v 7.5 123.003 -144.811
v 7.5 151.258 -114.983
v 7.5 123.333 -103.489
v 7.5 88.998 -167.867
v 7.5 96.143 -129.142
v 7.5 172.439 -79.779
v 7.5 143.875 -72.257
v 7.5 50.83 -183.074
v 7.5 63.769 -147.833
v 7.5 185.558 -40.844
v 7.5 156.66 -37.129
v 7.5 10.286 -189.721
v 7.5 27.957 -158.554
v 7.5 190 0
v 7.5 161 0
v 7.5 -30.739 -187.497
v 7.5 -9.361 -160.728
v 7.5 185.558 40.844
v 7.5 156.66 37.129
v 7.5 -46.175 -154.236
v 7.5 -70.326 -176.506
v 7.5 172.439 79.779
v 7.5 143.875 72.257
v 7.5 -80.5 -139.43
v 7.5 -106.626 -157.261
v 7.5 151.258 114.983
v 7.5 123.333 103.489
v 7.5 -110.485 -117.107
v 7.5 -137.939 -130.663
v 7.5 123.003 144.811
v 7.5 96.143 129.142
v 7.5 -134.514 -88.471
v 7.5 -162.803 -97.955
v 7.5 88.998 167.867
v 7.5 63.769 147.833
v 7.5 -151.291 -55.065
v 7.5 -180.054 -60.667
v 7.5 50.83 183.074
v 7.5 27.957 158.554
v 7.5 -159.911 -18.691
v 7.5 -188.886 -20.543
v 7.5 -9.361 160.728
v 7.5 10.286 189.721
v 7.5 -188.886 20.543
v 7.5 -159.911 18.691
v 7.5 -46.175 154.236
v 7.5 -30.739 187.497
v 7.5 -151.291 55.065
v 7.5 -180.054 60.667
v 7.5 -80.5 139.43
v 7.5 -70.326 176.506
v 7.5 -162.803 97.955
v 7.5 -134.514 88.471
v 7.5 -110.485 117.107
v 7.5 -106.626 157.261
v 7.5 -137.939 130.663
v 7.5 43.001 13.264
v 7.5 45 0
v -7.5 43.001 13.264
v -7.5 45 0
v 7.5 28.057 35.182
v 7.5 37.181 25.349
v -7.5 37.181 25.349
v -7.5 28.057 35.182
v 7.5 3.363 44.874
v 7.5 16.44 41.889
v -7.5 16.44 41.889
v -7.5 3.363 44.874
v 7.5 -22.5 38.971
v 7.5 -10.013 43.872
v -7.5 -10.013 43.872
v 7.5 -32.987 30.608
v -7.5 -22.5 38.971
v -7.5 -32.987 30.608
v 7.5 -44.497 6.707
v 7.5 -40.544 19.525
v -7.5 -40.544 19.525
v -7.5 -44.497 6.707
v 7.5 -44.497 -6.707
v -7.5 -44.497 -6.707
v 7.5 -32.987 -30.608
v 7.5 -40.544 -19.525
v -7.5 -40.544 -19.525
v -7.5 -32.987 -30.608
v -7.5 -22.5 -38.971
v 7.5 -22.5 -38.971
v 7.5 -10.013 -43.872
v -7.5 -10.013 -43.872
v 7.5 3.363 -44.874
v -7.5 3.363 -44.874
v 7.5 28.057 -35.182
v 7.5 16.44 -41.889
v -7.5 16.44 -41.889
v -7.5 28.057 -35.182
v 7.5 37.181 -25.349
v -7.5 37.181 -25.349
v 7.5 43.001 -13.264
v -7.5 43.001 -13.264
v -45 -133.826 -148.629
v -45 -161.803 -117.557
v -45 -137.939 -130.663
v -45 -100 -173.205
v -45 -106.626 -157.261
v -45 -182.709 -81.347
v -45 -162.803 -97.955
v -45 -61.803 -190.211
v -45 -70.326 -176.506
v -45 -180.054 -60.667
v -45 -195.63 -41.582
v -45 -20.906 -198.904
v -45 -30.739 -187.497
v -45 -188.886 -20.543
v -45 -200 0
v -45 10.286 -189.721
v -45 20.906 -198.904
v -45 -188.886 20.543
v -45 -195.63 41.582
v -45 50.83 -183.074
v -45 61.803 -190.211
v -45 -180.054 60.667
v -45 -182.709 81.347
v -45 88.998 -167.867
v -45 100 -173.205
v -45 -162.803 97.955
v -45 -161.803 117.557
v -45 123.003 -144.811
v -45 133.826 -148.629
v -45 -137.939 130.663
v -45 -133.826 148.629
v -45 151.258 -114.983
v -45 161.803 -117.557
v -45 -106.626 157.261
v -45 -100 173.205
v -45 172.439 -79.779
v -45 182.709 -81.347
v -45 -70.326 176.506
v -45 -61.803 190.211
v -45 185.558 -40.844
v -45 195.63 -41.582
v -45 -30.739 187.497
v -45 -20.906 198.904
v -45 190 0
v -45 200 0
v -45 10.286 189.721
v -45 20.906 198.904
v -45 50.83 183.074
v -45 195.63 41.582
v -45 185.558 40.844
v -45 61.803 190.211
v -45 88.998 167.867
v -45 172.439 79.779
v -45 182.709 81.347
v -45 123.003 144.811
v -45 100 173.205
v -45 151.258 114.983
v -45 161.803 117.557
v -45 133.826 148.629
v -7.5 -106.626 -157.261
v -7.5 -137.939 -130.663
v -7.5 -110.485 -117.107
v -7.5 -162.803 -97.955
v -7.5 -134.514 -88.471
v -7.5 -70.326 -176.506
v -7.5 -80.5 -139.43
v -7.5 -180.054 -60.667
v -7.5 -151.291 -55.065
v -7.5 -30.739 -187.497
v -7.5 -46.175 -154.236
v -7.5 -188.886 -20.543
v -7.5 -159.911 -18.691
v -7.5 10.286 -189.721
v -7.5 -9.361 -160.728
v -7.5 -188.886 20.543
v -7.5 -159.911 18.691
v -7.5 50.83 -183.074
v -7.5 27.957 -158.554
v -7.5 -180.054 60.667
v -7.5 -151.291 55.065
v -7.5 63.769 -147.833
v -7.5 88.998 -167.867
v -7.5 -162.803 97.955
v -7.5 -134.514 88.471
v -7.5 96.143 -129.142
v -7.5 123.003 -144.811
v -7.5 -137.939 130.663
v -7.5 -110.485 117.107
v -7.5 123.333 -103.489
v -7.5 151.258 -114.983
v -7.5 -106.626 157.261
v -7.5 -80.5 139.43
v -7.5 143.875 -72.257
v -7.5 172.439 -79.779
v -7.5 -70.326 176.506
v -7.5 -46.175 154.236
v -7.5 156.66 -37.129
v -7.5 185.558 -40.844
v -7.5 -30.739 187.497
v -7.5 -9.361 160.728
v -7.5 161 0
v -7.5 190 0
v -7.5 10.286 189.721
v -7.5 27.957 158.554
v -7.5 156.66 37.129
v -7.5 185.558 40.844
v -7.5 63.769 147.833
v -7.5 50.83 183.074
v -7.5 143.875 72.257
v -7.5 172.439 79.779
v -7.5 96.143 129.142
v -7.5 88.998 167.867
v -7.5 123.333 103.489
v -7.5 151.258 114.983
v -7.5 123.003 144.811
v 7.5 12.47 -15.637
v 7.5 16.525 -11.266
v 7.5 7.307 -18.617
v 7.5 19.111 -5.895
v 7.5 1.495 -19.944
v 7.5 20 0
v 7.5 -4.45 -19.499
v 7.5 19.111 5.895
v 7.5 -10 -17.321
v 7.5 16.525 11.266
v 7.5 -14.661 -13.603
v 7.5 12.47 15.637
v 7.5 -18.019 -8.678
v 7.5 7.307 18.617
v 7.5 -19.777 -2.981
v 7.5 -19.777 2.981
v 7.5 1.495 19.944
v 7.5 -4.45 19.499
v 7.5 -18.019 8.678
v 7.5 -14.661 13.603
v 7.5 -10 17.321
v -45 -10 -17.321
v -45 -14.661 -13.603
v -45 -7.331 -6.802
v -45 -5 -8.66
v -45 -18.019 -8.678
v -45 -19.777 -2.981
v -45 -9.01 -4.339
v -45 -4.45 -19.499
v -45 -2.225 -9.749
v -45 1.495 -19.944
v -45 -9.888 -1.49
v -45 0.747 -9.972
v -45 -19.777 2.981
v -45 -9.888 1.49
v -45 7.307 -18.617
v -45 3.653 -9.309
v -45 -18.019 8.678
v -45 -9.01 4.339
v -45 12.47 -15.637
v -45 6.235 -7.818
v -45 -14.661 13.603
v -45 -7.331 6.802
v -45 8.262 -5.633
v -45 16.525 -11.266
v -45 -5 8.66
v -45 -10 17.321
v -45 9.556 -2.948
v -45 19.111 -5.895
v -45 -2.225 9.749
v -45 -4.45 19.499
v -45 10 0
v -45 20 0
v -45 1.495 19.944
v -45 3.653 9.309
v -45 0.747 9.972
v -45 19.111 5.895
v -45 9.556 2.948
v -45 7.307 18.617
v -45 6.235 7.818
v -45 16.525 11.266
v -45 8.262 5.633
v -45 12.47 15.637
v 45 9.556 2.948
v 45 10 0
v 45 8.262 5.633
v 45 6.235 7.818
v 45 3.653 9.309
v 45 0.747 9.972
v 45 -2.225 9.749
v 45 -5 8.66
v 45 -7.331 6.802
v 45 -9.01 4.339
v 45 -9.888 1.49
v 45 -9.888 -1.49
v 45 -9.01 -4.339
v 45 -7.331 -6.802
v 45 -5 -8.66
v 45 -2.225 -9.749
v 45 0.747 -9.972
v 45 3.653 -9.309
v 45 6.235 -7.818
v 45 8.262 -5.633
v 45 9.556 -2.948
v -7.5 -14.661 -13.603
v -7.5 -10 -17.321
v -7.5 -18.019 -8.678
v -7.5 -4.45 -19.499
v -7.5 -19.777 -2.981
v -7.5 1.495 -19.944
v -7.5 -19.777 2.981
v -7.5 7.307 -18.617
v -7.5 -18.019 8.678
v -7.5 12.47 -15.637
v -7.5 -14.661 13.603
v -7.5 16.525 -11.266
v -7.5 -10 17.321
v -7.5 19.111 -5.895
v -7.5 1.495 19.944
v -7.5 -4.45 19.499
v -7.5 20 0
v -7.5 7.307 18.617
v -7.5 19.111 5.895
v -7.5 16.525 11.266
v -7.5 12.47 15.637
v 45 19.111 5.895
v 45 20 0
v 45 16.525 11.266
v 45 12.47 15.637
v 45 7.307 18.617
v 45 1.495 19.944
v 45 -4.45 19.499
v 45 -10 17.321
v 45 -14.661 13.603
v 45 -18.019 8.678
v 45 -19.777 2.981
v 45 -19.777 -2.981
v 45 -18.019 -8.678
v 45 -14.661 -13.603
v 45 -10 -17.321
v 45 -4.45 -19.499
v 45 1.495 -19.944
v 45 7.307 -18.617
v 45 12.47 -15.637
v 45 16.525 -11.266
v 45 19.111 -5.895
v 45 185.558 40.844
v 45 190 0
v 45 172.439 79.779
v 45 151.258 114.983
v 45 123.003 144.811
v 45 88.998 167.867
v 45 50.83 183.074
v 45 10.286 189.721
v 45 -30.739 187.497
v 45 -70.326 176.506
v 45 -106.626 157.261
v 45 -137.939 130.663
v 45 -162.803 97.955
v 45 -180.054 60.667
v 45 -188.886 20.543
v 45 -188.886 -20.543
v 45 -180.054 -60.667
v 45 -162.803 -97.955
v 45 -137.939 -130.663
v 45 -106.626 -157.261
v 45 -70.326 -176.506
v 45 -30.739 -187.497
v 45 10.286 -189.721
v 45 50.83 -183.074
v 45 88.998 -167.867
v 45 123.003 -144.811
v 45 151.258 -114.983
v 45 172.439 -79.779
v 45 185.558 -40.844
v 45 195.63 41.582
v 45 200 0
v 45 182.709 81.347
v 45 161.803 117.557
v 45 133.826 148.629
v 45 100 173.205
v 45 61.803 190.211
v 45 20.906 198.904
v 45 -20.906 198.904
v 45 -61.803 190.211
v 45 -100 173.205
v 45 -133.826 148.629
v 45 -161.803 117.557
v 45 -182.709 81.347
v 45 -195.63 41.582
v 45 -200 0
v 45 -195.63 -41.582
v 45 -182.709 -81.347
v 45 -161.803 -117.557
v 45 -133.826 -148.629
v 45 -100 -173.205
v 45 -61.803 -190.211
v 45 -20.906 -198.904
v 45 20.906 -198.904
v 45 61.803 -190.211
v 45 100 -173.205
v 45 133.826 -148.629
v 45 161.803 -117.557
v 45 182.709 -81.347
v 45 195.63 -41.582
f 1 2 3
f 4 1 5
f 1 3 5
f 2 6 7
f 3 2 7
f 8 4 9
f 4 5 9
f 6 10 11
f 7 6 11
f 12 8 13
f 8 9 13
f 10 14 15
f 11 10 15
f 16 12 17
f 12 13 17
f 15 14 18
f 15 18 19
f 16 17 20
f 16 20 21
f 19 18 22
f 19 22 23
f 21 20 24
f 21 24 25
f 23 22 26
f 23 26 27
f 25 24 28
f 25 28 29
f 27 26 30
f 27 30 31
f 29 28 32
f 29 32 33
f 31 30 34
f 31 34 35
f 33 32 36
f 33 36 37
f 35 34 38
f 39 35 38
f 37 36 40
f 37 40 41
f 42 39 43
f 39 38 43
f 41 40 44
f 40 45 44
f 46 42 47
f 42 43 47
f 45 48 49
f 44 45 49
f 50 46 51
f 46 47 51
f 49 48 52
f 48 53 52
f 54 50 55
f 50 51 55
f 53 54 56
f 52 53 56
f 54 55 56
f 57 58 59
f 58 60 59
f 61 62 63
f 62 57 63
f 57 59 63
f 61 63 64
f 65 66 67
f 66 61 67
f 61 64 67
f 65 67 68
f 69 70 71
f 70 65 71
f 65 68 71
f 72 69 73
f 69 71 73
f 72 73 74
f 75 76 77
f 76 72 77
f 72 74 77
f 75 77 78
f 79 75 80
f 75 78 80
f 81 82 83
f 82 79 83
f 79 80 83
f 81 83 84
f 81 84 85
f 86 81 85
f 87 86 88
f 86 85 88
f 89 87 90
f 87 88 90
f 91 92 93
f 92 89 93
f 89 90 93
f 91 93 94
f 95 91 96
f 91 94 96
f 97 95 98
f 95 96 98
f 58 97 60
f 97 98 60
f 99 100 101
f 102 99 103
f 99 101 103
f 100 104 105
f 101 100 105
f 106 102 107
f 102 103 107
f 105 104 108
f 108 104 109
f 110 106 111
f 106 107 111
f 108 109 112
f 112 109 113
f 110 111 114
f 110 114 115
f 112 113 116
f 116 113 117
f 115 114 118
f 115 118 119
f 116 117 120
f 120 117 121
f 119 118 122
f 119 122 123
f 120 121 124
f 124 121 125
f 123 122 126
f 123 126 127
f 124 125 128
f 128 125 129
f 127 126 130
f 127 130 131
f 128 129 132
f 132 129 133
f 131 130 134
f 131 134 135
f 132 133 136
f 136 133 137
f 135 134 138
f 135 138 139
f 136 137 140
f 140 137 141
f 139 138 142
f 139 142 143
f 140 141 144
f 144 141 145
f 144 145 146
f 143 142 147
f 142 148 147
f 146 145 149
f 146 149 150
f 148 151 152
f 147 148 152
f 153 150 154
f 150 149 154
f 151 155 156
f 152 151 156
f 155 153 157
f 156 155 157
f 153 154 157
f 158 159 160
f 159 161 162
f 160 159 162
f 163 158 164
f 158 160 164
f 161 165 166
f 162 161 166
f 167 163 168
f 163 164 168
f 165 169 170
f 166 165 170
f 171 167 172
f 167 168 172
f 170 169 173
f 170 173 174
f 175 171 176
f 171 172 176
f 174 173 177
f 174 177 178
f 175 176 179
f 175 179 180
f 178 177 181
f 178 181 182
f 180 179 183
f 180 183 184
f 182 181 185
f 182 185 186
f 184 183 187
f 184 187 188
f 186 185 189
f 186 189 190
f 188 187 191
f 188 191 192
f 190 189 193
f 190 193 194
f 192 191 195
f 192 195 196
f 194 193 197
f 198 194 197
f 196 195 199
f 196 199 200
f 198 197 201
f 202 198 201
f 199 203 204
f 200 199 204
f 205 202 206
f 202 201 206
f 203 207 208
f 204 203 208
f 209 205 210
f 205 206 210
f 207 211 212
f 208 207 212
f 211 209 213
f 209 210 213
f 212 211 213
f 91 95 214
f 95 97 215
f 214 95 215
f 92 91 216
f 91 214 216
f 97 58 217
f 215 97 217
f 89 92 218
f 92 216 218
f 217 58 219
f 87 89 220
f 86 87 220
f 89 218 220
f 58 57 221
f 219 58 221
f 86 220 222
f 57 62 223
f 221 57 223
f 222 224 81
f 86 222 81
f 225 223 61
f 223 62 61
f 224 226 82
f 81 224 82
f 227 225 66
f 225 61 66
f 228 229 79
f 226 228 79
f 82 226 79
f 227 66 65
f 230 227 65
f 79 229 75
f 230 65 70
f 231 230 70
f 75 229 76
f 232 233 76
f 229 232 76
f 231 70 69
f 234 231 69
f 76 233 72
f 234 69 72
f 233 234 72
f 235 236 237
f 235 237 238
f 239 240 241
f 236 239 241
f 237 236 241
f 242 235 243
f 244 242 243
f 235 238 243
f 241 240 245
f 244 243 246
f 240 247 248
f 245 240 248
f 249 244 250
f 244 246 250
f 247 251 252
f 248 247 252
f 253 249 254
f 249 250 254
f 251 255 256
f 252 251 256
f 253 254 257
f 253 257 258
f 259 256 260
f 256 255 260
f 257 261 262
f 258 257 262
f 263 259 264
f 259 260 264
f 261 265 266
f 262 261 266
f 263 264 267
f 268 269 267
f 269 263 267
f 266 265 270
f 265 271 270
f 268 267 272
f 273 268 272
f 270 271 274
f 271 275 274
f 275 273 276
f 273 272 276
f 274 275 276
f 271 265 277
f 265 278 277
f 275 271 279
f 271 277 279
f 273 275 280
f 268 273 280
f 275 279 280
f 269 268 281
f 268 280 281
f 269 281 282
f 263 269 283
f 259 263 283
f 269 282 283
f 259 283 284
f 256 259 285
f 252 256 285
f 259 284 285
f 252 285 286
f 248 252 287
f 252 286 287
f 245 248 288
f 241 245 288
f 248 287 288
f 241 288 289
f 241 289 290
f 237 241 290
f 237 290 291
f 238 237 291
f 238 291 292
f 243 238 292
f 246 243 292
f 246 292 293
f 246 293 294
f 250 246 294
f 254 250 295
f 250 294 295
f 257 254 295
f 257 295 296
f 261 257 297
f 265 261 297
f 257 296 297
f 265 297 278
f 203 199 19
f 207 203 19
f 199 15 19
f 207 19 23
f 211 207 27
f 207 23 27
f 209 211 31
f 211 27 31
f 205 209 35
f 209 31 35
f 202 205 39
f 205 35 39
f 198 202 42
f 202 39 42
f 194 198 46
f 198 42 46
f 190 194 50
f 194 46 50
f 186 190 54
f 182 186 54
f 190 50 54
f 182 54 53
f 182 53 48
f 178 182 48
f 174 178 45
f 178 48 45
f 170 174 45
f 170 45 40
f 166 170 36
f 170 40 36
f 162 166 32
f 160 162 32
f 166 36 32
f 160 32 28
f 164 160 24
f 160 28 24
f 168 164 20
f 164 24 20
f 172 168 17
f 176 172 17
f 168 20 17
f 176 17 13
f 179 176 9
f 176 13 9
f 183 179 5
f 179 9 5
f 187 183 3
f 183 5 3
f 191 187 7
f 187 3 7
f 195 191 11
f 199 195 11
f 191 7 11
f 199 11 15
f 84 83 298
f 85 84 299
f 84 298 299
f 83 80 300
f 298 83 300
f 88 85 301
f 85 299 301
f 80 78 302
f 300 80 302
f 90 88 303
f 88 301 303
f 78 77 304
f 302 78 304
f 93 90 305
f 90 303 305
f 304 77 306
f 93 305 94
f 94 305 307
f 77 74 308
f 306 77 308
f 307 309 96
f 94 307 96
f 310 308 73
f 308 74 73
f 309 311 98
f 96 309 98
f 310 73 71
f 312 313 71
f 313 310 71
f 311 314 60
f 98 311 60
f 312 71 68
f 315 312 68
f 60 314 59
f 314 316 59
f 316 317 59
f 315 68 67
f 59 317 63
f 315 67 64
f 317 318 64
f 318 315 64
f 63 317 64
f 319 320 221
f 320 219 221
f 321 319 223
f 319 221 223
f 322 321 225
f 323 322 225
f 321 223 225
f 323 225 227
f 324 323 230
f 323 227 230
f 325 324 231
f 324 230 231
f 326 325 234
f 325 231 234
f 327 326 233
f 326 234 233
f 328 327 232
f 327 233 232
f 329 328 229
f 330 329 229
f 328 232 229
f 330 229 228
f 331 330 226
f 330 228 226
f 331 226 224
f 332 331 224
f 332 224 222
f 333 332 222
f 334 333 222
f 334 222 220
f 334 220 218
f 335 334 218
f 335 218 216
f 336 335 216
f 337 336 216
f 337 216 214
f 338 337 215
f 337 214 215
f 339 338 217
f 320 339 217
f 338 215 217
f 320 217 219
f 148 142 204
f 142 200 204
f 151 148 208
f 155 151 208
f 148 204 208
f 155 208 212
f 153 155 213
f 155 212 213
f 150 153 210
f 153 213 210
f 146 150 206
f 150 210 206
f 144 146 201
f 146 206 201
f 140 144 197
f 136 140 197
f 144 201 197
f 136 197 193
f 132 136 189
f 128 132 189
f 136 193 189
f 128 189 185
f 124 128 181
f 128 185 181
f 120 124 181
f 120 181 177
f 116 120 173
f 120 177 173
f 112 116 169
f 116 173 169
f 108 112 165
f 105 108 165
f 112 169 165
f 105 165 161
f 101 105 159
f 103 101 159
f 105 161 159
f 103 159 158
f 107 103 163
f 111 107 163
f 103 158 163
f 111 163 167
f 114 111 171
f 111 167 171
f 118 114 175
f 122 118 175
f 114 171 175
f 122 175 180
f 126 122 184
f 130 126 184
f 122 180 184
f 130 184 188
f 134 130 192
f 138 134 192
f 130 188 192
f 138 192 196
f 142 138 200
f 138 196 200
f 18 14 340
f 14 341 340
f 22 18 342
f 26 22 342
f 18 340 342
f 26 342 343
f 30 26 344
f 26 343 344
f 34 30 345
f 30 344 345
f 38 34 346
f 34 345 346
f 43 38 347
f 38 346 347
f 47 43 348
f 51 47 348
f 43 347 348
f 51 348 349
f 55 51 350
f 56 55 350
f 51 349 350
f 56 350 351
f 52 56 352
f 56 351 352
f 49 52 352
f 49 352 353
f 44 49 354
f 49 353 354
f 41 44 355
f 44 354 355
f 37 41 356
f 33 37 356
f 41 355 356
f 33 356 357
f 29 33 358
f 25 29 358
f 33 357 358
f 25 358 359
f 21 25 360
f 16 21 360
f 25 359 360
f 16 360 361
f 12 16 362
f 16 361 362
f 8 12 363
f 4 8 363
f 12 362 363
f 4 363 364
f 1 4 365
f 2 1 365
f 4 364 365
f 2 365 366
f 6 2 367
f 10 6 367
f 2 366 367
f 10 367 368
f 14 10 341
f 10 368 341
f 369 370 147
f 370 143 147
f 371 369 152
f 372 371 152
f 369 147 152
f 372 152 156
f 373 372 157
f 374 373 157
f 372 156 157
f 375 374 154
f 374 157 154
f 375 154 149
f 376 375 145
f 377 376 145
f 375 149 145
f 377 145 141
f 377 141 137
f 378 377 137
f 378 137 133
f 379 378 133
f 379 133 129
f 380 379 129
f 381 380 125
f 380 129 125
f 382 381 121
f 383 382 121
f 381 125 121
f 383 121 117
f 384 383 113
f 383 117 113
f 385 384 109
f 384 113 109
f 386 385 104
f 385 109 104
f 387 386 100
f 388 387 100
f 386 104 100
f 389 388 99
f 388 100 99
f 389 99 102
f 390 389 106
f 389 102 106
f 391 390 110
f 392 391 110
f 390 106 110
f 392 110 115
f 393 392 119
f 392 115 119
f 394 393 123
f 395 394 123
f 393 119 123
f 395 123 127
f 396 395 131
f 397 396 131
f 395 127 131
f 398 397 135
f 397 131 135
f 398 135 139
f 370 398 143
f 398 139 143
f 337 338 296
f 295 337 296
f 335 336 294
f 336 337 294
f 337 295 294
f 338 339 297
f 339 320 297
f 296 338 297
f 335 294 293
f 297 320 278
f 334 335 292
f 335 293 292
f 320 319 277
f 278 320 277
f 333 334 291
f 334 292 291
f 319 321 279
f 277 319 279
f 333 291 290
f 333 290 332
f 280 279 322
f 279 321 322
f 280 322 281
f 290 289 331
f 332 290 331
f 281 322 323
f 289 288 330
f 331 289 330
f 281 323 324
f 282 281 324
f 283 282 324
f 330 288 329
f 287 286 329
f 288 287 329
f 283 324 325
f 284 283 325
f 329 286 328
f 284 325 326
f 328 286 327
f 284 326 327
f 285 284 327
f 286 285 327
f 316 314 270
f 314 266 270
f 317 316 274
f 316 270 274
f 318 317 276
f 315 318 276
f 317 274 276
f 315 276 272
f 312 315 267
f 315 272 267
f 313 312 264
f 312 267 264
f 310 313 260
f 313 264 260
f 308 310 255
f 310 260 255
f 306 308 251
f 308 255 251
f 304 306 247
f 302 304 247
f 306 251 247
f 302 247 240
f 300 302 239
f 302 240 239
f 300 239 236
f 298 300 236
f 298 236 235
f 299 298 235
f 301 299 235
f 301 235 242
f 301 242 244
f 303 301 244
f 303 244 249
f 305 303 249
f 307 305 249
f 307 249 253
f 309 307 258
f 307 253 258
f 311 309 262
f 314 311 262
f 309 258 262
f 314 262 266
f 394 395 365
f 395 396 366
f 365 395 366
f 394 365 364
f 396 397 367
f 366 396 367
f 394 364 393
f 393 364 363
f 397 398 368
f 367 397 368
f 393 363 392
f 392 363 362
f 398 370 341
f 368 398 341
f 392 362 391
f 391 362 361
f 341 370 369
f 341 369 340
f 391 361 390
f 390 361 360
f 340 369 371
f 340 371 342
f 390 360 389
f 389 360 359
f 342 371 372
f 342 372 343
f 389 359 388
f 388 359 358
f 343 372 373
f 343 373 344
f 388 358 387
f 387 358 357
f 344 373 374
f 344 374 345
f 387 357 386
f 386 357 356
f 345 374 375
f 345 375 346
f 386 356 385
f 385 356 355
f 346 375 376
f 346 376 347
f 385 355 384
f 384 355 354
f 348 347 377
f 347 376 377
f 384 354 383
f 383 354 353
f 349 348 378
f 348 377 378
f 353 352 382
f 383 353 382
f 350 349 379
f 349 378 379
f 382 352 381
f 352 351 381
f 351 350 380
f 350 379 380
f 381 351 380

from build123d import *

# Parameters (mm, degrees)
F2_R     = 160.999998
F2_R_2   = 45.000002
F3_DEPTH = 15


with BuildPart() as f1:
    # F0 (on Top) → F1 (revolve)
    with BuildSketch(Plane.XY):
        Polygon((-45, 20), (-45, 10), (45, 10), (45, 20), (7.5, 20), (7.5, 190), (45, 190), (45, 200), (-45, 200), (-45, 190), (-7.5, 190), (-7.5, 20), align=None)
    revolve(axis=Axis((0, 0, 0), (1, 0, 0)))

    # F2 (on Right) → F3 (cut, symmetric)
    with BuildSketch(Plane.YZ):
        Circle(F2_R)
        Circle(F2_R_2, mode=Mode.SUBTRACT)
    extrude(amount=F3_DEPTH, both=True, mode=Mode.SUBTRACT)


solid = f1.part
